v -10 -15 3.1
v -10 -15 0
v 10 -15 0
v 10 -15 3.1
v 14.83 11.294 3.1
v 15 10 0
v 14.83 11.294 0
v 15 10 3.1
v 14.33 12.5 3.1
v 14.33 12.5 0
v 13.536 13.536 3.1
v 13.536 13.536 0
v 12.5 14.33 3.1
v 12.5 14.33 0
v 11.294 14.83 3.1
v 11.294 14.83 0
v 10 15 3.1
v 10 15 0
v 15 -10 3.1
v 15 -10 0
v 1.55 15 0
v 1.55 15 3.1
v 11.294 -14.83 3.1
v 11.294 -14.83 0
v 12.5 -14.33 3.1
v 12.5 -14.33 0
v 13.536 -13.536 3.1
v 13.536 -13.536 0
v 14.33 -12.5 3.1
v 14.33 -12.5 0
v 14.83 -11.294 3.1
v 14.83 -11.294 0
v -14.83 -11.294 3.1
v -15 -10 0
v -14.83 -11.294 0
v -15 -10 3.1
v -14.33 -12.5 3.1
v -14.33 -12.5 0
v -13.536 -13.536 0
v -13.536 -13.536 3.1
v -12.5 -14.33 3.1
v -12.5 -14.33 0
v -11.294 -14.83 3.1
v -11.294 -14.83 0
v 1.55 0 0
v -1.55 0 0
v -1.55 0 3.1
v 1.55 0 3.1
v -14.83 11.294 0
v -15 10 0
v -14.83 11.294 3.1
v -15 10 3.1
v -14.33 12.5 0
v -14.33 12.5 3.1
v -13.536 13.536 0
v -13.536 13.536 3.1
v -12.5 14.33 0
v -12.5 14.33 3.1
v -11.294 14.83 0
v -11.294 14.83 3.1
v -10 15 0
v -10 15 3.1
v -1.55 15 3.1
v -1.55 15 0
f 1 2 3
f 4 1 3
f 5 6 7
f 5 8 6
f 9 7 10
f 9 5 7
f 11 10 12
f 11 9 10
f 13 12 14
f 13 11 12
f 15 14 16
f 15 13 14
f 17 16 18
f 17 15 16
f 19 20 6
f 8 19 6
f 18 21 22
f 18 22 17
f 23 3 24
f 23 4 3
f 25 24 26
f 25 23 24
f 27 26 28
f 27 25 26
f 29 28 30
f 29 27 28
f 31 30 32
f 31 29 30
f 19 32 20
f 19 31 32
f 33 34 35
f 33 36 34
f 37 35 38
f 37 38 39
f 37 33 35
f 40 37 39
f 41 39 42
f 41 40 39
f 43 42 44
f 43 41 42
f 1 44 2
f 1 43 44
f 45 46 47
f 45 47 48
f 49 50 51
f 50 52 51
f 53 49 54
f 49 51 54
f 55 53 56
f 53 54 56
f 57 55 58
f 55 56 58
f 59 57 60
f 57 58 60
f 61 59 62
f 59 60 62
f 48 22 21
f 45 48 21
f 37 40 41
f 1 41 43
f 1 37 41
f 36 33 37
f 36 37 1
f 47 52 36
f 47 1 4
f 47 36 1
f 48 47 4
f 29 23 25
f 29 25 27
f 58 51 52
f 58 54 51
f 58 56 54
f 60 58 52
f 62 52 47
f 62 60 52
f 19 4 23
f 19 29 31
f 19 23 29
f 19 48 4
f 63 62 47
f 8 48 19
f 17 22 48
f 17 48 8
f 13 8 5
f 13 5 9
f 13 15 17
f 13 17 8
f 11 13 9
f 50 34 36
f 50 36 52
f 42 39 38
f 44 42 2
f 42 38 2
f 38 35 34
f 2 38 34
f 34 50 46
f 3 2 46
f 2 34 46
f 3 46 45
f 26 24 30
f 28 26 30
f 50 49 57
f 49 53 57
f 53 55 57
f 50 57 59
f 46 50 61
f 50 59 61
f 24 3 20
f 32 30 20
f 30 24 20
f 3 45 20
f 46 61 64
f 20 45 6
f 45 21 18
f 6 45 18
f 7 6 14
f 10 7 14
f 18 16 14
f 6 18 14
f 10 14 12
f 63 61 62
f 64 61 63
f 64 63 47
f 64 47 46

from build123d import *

# Parameters (mm, degrees)
SKETCH1_W           = 30
SKETCH1_H           = 30
BOSS_EXTRUDE1_DEPTH = 3.1
SKETCH2_W           = 3.1
SKETCH2_H           = 3.1
CUT_EXTRUDE1_DEPTH  = 15
FILLET1_R           = 5


with BuildPart() as part:
    # Sketch1 → Boss-Extrude1 (new body)
    with BuildSketch(Plane.XY):
        Rectangle(SKETCH1_W, SKETCH1_H)
    extrude(amount=BOSS_EXTRUDE1_DEPTH)

    # Sketch2 → Cut-Extrude1 (cut)
    with BuildSketch(Plane(origin=(0, 15, 0), x_dir=(1, 0, 0), z_dir=(0, 1, 0))):
        with Locations((0, -1.55)):
            Rectangle(SKETCH2_W, SKETCH2_H)
    extrude(amount=-CUT_EXTRUDE1_DEPTH, mode=Mode.SUBTRACT)

    # Fillet1
    fillet1_edges = [part.edges().sort_by_distance(p)[0] for p in [
        (15, -15, 1.55),
        (-15, -15, 1.55),
        (-15, 15, 1.55),
        (15, 15, 1.55),
    ]]
    fillet(fillet1_edges, radius=FILLET1_R)


solid = part.part
